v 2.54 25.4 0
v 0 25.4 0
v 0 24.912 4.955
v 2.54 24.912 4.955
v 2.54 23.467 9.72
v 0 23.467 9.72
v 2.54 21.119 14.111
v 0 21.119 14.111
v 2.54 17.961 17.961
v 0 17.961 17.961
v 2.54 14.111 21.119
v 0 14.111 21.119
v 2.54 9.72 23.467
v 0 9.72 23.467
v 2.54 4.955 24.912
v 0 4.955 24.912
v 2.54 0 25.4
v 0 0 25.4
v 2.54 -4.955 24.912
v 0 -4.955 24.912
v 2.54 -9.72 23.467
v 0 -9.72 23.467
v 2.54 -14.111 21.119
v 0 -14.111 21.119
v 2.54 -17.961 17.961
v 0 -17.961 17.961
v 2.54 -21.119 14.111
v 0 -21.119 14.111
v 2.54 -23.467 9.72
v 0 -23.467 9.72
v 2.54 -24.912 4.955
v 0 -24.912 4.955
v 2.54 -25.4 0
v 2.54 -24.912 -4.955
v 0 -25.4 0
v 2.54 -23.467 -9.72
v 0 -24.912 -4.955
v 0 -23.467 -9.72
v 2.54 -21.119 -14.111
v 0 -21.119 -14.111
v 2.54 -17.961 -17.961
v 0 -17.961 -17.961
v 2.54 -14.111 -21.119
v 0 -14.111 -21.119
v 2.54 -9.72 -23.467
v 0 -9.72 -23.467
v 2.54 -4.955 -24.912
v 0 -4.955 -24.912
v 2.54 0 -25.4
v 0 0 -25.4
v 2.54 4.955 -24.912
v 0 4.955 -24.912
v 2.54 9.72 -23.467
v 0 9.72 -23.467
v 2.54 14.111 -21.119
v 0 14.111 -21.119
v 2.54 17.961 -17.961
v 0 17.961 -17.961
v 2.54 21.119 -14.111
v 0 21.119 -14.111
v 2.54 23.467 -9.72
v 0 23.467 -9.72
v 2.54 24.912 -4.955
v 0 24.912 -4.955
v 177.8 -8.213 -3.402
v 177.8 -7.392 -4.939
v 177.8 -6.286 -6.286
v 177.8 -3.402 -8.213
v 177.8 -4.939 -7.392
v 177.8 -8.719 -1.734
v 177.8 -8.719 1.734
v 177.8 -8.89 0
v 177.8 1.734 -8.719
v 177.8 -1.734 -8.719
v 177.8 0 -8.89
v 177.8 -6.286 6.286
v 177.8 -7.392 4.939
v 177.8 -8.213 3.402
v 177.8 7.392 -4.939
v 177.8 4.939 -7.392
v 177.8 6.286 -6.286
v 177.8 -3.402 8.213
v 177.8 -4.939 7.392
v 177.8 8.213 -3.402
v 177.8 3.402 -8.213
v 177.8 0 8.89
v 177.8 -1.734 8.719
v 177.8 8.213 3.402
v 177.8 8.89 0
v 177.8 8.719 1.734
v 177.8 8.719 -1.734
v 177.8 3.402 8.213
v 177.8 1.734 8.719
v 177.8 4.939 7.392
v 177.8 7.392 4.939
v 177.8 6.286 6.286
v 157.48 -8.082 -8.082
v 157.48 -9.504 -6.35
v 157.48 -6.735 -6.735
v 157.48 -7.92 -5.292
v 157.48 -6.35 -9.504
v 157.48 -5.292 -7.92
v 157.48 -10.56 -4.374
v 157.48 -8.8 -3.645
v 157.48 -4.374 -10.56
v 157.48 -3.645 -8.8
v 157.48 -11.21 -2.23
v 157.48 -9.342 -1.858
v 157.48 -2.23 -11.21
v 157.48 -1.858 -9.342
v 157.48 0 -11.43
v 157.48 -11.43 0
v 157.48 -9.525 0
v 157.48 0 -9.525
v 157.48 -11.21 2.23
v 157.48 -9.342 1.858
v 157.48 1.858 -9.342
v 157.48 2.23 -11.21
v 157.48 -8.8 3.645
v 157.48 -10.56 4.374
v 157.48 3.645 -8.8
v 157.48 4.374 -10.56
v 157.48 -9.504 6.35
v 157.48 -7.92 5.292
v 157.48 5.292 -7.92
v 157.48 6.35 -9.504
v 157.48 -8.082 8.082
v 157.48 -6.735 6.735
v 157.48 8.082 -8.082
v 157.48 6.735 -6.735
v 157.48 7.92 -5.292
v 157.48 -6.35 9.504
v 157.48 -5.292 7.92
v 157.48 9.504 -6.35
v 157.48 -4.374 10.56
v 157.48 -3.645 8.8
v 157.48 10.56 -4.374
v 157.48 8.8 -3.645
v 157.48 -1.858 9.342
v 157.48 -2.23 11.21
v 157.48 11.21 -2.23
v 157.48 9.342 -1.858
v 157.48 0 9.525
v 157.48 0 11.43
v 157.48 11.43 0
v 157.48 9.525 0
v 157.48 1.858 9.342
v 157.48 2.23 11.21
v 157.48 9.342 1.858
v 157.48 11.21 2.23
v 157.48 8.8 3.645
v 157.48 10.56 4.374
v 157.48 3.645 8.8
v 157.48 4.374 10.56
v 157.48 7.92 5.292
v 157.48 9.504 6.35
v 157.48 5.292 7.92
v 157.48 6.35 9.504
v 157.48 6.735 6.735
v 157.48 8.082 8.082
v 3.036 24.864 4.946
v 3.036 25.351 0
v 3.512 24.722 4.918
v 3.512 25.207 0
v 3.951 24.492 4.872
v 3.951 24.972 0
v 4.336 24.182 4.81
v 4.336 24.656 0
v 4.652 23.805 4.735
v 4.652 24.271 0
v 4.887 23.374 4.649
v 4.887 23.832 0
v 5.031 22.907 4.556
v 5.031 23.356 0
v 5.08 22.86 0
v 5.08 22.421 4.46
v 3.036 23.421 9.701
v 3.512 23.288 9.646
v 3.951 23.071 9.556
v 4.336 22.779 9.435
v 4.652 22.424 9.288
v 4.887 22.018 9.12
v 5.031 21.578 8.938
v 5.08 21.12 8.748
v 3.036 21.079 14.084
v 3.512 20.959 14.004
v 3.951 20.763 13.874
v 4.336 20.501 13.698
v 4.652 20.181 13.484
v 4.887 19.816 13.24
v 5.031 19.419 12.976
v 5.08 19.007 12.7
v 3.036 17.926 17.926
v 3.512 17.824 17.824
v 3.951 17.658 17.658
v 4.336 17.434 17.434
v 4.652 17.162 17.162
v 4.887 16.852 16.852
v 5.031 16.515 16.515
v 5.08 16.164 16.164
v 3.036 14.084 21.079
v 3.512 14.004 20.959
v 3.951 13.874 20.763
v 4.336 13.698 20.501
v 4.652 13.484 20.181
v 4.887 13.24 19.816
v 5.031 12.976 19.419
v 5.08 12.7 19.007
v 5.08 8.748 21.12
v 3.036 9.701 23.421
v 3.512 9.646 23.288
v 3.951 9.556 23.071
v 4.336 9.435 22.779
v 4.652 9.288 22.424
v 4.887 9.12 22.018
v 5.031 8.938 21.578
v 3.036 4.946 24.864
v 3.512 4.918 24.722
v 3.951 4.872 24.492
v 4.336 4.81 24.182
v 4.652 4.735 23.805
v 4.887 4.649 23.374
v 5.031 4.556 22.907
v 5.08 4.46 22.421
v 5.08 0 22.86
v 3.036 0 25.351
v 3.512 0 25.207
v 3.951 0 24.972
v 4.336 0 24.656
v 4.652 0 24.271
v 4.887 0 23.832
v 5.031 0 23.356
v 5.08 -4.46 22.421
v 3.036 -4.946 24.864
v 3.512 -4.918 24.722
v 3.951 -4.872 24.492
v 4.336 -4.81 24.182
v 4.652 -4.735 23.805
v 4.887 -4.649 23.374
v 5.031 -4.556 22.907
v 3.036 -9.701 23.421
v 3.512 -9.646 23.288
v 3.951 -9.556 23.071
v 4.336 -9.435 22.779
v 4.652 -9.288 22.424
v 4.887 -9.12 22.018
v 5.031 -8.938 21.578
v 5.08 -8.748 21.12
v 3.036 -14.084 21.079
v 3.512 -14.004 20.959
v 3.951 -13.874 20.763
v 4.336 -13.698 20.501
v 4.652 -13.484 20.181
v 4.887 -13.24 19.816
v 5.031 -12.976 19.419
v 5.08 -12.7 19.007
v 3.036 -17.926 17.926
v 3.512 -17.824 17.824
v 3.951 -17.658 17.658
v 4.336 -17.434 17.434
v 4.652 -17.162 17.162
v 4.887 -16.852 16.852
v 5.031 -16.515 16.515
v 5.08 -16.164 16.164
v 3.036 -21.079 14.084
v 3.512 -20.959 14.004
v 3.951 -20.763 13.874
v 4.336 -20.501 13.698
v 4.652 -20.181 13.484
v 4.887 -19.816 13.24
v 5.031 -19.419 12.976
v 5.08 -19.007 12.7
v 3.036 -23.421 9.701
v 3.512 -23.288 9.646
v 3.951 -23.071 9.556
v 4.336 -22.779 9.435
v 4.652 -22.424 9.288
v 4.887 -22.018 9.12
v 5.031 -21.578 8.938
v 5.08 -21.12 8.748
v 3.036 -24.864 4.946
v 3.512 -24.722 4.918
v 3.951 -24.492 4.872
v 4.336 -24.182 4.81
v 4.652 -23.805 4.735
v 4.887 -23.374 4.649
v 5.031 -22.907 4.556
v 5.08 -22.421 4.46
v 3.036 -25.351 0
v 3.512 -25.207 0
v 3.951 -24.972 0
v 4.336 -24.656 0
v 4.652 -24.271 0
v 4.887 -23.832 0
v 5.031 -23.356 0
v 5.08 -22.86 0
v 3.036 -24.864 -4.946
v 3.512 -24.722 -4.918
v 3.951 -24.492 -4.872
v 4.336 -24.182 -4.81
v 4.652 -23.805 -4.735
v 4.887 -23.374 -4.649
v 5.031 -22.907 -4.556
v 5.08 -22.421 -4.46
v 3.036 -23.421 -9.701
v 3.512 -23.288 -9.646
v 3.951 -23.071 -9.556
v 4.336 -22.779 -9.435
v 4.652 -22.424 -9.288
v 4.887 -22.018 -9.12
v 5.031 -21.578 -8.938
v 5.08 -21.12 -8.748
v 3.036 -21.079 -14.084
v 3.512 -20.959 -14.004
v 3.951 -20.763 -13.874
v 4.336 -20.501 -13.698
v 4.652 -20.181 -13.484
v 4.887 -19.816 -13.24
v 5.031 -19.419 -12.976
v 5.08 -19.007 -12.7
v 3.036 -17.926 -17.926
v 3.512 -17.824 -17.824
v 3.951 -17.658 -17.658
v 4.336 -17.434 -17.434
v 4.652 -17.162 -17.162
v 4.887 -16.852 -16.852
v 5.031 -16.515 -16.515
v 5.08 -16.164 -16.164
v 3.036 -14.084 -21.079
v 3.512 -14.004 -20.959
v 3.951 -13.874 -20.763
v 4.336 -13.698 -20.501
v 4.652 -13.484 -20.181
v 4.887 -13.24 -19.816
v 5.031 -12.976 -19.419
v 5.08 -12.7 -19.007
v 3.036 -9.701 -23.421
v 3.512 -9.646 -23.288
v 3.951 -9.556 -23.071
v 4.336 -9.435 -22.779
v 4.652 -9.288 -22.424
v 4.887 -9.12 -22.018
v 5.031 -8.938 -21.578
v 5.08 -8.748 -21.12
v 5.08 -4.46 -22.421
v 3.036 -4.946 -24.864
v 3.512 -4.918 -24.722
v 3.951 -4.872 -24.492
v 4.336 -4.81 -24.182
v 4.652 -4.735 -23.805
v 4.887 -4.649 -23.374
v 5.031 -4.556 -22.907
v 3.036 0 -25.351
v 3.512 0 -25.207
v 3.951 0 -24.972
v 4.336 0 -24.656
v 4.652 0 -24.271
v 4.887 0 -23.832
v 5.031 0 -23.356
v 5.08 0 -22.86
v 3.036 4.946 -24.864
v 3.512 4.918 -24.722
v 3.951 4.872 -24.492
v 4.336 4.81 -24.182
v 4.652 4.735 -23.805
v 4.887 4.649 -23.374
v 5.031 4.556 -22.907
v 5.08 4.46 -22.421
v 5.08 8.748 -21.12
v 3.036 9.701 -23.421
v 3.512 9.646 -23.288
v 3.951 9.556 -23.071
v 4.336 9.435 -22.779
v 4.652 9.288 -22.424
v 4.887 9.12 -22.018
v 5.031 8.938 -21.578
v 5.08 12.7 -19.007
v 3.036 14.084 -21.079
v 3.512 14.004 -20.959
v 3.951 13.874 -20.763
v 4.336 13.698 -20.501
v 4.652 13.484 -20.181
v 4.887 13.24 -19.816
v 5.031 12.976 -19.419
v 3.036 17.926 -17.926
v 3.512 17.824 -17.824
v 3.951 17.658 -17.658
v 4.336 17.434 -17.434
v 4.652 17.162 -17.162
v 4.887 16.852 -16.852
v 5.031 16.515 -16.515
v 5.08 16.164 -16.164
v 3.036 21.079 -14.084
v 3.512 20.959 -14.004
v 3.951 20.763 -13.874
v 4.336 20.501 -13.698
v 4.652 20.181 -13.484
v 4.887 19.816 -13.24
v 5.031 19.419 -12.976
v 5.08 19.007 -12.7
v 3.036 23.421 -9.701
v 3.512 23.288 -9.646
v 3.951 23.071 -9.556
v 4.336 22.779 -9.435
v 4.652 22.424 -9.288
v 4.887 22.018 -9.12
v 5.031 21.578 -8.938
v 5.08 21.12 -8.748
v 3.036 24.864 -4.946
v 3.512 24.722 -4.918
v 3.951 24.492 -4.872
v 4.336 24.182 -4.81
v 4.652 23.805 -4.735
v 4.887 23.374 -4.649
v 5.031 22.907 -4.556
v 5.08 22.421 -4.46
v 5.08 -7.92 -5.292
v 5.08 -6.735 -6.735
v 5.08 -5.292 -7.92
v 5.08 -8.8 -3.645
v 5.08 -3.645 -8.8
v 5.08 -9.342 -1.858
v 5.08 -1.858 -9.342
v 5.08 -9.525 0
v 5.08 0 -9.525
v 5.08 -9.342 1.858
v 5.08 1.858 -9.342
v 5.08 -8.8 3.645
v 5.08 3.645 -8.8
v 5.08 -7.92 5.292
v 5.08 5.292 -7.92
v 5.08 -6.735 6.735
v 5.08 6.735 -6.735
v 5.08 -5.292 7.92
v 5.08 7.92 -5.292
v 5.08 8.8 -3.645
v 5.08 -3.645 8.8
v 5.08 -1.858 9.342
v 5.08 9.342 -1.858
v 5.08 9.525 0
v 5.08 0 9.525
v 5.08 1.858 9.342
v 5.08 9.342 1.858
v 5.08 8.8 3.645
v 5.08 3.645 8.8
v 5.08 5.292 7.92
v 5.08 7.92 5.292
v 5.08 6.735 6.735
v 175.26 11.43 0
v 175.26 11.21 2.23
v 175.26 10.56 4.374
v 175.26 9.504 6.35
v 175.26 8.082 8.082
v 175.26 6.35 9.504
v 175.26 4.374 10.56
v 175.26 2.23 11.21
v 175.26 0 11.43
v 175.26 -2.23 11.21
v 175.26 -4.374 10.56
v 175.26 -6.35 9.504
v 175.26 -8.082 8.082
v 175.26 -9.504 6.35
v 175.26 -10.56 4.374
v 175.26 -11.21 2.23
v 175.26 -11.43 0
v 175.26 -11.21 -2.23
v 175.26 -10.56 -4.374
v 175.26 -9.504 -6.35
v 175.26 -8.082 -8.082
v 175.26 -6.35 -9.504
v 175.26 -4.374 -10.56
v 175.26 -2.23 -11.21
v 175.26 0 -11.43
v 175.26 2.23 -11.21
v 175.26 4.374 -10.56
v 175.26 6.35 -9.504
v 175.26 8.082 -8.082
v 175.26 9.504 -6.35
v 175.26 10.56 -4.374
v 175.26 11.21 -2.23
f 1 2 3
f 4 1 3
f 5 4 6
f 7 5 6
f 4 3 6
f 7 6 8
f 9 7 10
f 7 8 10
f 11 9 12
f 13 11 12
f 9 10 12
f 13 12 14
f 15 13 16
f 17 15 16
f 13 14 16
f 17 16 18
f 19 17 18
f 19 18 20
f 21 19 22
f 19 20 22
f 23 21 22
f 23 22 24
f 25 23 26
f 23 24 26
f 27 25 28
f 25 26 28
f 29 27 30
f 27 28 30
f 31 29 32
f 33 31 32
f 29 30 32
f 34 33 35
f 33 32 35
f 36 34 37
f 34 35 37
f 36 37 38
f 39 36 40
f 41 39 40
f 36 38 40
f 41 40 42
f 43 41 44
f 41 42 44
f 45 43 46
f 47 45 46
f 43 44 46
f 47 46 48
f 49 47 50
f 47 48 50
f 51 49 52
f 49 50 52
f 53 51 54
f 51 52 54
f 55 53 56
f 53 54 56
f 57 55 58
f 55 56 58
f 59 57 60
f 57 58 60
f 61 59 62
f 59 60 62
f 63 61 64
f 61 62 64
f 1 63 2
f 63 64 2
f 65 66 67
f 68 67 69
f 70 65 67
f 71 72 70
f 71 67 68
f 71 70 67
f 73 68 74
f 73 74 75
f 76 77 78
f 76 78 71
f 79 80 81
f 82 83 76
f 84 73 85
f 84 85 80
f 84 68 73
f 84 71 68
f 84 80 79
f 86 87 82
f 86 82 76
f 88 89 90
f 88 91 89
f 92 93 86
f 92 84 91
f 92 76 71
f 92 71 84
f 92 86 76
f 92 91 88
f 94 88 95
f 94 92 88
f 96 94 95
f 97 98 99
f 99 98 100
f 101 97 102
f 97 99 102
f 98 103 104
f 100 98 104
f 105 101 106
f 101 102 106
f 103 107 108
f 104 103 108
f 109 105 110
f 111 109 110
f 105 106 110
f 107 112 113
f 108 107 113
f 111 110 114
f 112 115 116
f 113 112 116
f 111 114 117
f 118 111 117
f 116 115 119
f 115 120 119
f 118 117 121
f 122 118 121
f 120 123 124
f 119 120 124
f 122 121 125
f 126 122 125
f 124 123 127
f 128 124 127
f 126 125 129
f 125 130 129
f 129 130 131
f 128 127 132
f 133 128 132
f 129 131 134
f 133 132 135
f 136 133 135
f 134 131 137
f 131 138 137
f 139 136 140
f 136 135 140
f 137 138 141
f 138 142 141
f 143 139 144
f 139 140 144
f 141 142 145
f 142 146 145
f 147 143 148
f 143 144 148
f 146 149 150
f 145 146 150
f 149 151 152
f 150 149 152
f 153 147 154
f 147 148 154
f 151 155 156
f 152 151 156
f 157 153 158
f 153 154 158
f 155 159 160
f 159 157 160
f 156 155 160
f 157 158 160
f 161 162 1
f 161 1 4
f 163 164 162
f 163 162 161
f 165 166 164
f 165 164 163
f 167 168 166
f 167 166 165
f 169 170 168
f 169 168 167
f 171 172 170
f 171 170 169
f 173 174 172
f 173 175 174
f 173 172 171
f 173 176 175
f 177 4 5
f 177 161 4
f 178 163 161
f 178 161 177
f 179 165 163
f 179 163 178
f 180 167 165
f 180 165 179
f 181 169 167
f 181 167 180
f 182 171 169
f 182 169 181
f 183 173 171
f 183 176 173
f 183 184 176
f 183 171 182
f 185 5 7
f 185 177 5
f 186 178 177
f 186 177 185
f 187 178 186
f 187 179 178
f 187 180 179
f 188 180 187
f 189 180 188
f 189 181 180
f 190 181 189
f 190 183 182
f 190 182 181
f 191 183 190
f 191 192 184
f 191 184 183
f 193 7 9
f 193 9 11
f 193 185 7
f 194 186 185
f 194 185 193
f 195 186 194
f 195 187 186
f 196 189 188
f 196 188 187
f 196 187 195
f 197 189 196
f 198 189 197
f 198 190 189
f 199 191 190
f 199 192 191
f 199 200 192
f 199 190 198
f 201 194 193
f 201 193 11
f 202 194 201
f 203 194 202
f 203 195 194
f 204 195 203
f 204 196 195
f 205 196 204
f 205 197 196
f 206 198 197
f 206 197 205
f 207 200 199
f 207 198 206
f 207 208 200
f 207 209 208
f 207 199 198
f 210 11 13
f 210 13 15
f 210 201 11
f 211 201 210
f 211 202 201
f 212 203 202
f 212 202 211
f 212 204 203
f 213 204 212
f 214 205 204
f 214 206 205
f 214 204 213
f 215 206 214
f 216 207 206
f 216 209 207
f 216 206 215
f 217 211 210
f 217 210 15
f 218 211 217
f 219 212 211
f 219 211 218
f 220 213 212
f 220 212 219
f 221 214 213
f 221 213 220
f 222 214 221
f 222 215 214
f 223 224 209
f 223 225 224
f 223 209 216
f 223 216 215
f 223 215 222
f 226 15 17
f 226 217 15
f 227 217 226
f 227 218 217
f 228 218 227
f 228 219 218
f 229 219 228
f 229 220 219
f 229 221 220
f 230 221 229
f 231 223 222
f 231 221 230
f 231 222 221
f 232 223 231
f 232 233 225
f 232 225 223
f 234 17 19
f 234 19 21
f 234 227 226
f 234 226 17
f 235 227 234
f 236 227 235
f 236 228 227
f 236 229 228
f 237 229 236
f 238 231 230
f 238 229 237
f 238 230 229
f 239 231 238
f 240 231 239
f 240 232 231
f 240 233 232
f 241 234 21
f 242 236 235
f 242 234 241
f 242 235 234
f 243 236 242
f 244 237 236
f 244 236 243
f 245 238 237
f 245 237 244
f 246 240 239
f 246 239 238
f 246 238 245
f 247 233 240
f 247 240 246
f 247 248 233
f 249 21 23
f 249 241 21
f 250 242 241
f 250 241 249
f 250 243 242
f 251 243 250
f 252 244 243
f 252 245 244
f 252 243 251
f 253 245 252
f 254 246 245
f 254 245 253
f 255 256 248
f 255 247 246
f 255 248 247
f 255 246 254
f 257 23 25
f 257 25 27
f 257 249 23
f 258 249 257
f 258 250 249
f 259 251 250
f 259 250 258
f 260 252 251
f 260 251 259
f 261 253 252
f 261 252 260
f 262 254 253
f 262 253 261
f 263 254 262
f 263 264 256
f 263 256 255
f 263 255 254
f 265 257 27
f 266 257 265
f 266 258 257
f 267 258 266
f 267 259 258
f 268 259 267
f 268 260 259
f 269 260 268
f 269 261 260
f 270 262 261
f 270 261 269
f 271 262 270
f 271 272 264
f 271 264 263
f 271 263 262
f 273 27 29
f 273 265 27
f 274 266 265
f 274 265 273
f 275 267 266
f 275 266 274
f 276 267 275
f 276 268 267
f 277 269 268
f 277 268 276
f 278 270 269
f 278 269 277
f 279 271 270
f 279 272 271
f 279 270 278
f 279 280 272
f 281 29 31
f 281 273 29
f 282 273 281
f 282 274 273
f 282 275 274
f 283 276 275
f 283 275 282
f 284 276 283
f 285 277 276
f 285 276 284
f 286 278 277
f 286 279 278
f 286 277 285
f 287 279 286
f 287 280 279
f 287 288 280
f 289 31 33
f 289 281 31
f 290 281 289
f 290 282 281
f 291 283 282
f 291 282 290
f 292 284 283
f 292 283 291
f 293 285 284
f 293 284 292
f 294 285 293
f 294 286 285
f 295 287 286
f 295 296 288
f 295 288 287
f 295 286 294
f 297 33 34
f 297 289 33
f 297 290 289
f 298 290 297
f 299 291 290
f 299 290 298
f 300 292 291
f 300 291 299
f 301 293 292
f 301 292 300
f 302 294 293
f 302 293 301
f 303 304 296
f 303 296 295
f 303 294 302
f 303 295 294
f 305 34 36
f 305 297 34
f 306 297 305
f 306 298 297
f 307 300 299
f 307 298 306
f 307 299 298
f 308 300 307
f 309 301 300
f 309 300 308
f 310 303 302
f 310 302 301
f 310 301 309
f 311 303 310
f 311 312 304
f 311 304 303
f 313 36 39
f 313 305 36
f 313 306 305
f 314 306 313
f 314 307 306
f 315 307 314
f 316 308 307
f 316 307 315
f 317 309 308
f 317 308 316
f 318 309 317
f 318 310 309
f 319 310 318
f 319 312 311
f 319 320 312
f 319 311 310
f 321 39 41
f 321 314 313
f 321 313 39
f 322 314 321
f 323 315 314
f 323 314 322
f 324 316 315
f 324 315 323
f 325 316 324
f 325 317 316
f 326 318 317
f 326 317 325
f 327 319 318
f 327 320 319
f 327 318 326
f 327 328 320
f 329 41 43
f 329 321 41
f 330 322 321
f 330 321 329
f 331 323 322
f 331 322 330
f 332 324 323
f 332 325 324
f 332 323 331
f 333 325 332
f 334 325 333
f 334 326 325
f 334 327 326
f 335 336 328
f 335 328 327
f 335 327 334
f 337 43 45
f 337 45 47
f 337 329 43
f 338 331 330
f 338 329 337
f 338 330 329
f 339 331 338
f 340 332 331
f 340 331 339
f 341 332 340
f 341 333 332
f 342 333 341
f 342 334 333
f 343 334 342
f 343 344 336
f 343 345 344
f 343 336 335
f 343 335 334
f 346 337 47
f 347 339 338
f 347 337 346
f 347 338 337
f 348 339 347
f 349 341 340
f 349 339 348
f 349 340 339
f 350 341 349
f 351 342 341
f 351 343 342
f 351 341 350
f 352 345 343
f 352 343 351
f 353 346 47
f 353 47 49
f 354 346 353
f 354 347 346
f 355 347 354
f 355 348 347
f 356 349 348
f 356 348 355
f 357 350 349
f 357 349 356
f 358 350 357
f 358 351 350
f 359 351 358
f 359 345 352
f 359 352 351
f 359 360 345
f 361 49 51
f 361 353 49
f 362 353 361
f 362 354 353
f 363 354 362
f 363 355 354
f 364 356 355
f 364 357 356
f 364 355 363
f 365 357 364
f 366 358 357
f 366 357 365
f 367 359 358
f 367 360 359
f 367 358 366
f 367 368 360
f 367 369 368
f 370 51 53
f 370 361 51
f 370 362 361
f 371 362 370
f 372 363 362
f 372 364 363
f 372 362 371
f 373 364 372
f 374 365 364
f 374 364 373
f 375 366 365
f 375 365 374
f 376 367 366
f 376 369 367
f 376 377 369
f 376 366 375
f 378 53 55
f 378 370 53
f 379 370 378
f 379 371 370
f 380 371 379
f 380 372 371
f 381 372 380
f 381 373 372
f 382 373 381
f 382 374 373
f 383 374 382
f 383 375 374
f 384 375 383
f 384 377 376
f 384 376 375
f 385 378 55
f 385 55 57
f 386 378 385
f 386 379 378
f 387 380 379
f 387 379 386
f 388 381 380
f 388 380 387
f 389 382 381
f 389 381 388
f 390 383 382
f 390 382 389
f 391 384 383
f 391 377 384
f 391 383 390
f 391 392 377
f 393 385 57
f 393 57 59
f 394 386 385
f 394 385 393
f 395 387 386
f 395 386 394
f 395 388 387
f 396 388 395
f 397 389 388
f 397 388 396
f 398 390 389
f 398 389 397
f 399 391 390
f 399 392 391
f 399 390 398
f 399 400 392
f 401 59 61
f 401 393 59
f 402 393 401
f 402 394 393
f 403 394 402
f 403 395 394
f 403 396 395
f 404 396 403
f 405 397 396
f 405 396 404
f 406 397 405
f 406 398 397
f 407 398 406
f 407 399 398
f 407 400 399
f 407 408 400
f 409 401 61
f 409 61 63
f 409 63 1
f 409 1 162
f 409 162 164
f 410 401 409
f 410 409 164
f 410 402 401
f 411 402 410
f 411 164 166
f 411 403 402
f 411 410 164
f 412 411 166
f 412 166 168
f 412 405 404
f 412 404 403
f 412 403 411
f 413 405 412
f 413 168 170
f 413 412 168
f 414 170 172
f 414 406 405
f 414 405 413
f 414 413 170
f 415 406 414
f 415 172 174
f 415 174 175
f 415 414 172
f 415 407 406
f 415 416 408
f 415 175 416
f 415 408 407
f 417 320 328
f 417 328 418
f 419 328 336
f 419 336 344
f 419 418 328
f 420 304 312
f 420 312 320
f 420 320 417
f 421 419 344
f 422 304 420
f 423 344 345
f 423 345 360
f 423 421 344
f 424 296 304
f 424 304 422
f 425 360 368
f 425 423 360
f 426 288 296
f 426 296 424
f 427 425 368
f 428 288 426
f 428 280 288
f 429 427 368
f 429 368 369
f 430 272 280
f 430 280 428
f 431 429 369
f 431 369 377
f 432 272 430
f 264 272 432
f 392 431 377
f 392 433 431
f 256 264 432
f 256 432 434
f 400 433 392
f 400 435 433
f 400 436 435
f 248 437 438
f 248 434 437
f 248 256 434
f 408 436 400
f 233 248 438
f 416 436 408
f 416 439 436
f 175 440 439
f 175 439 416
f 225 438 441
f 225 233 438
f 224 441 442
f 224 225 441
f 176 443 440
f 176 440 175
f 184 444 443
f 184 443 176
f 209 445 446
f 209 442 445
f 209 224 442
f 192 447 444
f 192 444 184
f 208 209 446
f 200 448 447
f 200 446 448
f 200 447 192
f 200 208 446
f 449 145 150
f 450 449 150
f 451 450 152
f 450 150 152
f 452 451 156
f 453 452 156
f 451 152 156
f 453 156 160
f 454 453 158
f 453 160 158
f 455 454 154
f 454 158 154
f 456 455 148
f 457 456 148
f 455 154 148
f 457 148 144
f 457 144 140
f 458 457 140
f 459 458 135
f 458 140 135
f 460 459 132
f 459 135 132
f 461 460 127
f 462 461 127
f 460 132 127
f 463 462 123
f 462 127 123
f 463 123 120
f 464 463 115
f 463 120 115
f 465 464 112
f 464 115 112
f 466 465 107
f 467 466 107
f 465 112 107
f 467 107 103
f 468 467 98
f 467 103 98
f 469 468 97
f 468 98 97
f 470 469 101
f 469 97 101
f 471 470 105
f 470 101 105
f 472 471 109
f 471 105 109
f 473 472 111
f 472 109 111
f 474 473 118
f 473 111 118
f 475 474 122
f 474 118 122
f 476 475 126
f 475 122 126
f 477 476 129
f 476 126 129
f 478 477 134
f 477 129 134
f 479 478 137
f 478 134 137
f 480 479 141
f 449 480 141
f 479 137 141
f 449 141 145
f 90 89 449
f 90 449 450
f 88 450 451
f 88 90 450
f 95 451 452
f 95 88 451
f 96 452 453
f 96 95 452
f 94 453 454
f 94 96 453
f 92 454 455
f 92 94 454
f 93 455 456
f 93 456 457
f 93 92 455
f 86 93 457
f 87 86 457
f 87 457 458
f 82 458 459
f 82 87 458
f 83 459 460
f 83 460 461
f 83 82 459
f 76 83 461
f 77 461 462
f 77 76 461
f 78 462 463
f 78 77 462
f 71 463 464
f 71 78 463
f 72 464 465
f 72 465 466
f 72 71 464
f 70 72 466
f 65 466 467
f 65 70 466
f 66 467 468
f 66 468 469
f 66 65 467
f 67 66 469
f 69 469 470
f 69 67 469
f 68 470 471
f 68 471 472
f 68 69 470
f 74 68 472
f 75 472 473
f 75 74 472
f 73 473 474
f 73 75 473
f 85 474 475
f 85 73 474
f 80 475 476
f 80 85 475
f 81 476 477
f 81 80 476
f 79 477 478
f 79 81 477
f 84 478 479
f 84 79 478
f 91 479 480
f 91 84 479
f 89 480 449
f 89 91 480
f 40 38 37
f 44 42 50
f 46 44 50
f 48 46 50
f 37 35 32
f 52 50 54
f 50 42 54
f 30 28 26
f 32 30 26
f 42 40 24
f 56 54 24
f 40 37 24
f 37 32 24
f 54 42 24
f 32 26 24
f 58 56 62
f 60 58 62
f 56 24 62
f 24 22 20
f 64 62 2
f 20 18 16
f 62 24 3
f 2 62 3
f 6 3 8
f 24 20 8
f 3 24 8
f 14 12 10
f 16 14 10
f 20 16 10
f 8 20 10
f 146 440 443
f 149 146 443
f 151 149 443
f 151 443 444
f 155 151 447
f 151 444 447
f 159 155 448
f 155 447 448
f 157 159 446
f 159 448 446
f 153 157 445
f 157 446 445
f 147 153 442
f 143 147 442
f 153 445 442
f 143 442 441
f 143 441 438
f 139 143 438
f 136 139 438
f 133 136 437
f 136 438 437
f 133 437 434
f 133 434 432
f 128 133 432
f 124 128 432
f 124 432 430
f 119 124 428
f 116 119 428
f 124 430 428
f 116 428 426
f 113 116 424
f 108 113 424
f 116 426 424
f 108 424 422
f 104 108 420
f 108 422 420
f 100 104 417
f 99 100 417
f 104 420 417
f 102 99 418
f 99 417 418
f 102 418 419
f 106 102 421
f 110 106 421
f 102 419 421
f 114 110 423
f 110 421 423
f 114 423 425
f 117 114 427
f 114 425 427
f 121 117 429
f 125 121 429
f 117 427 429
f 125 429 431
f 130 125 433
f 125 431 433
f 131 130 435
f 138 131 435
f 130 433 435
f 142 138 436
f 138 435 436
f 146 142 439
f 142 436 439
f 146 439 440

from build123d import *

# Parameters (mm, degrees)
F0_R     = 25.4
F1_DEPTH = 5.08
F2_R     = 2.54
F3_R     = 9.525
F4_DEPTH = 152.4
F5_R     = 11.43
F5_R_2   = 9.525
F6_DEPTH = 20.32
F7_SIZE  = 2.54


with BuildPart() as f1:
    # F0 (on Right) → F1 (new body)
    with BuildSketch(Plane.YZ):
        Circle(F0_R)
    extrude(amount=F1_DEPTH)

    # F2
    f2_edges = [f1.edges().sort_by_distance(p)[0] for p in [
        (5.08, -25.4, 0),
    ]]
    fillet(f2_edges, radius=F2_R)

    # F3 (on face) → F4 (join)
    with BuildSketch(Plane.YZ.offset(5.08)):
        Circle(F3_R)
    extrude(amount=F4_DEPTH)

    # F5 (on face) → F6 (join)
    with BuildSketch(Plane.YZ.offset(157.48)):
        Circle(F5_R)
        Circle(F5_R_2, mode=Mode.SUBTRACT)
        Circle(F5_R_2)
    extrude(amount=F6_DEPTH)

    # F7
    f7_edges = [f1.edges().sort_by_distance(p)[0] for p in [
        (177.8, -11.43, 0),
    ]]
    chamfer(f7_edges, length=F7_SIZE)


solid = f1.part
